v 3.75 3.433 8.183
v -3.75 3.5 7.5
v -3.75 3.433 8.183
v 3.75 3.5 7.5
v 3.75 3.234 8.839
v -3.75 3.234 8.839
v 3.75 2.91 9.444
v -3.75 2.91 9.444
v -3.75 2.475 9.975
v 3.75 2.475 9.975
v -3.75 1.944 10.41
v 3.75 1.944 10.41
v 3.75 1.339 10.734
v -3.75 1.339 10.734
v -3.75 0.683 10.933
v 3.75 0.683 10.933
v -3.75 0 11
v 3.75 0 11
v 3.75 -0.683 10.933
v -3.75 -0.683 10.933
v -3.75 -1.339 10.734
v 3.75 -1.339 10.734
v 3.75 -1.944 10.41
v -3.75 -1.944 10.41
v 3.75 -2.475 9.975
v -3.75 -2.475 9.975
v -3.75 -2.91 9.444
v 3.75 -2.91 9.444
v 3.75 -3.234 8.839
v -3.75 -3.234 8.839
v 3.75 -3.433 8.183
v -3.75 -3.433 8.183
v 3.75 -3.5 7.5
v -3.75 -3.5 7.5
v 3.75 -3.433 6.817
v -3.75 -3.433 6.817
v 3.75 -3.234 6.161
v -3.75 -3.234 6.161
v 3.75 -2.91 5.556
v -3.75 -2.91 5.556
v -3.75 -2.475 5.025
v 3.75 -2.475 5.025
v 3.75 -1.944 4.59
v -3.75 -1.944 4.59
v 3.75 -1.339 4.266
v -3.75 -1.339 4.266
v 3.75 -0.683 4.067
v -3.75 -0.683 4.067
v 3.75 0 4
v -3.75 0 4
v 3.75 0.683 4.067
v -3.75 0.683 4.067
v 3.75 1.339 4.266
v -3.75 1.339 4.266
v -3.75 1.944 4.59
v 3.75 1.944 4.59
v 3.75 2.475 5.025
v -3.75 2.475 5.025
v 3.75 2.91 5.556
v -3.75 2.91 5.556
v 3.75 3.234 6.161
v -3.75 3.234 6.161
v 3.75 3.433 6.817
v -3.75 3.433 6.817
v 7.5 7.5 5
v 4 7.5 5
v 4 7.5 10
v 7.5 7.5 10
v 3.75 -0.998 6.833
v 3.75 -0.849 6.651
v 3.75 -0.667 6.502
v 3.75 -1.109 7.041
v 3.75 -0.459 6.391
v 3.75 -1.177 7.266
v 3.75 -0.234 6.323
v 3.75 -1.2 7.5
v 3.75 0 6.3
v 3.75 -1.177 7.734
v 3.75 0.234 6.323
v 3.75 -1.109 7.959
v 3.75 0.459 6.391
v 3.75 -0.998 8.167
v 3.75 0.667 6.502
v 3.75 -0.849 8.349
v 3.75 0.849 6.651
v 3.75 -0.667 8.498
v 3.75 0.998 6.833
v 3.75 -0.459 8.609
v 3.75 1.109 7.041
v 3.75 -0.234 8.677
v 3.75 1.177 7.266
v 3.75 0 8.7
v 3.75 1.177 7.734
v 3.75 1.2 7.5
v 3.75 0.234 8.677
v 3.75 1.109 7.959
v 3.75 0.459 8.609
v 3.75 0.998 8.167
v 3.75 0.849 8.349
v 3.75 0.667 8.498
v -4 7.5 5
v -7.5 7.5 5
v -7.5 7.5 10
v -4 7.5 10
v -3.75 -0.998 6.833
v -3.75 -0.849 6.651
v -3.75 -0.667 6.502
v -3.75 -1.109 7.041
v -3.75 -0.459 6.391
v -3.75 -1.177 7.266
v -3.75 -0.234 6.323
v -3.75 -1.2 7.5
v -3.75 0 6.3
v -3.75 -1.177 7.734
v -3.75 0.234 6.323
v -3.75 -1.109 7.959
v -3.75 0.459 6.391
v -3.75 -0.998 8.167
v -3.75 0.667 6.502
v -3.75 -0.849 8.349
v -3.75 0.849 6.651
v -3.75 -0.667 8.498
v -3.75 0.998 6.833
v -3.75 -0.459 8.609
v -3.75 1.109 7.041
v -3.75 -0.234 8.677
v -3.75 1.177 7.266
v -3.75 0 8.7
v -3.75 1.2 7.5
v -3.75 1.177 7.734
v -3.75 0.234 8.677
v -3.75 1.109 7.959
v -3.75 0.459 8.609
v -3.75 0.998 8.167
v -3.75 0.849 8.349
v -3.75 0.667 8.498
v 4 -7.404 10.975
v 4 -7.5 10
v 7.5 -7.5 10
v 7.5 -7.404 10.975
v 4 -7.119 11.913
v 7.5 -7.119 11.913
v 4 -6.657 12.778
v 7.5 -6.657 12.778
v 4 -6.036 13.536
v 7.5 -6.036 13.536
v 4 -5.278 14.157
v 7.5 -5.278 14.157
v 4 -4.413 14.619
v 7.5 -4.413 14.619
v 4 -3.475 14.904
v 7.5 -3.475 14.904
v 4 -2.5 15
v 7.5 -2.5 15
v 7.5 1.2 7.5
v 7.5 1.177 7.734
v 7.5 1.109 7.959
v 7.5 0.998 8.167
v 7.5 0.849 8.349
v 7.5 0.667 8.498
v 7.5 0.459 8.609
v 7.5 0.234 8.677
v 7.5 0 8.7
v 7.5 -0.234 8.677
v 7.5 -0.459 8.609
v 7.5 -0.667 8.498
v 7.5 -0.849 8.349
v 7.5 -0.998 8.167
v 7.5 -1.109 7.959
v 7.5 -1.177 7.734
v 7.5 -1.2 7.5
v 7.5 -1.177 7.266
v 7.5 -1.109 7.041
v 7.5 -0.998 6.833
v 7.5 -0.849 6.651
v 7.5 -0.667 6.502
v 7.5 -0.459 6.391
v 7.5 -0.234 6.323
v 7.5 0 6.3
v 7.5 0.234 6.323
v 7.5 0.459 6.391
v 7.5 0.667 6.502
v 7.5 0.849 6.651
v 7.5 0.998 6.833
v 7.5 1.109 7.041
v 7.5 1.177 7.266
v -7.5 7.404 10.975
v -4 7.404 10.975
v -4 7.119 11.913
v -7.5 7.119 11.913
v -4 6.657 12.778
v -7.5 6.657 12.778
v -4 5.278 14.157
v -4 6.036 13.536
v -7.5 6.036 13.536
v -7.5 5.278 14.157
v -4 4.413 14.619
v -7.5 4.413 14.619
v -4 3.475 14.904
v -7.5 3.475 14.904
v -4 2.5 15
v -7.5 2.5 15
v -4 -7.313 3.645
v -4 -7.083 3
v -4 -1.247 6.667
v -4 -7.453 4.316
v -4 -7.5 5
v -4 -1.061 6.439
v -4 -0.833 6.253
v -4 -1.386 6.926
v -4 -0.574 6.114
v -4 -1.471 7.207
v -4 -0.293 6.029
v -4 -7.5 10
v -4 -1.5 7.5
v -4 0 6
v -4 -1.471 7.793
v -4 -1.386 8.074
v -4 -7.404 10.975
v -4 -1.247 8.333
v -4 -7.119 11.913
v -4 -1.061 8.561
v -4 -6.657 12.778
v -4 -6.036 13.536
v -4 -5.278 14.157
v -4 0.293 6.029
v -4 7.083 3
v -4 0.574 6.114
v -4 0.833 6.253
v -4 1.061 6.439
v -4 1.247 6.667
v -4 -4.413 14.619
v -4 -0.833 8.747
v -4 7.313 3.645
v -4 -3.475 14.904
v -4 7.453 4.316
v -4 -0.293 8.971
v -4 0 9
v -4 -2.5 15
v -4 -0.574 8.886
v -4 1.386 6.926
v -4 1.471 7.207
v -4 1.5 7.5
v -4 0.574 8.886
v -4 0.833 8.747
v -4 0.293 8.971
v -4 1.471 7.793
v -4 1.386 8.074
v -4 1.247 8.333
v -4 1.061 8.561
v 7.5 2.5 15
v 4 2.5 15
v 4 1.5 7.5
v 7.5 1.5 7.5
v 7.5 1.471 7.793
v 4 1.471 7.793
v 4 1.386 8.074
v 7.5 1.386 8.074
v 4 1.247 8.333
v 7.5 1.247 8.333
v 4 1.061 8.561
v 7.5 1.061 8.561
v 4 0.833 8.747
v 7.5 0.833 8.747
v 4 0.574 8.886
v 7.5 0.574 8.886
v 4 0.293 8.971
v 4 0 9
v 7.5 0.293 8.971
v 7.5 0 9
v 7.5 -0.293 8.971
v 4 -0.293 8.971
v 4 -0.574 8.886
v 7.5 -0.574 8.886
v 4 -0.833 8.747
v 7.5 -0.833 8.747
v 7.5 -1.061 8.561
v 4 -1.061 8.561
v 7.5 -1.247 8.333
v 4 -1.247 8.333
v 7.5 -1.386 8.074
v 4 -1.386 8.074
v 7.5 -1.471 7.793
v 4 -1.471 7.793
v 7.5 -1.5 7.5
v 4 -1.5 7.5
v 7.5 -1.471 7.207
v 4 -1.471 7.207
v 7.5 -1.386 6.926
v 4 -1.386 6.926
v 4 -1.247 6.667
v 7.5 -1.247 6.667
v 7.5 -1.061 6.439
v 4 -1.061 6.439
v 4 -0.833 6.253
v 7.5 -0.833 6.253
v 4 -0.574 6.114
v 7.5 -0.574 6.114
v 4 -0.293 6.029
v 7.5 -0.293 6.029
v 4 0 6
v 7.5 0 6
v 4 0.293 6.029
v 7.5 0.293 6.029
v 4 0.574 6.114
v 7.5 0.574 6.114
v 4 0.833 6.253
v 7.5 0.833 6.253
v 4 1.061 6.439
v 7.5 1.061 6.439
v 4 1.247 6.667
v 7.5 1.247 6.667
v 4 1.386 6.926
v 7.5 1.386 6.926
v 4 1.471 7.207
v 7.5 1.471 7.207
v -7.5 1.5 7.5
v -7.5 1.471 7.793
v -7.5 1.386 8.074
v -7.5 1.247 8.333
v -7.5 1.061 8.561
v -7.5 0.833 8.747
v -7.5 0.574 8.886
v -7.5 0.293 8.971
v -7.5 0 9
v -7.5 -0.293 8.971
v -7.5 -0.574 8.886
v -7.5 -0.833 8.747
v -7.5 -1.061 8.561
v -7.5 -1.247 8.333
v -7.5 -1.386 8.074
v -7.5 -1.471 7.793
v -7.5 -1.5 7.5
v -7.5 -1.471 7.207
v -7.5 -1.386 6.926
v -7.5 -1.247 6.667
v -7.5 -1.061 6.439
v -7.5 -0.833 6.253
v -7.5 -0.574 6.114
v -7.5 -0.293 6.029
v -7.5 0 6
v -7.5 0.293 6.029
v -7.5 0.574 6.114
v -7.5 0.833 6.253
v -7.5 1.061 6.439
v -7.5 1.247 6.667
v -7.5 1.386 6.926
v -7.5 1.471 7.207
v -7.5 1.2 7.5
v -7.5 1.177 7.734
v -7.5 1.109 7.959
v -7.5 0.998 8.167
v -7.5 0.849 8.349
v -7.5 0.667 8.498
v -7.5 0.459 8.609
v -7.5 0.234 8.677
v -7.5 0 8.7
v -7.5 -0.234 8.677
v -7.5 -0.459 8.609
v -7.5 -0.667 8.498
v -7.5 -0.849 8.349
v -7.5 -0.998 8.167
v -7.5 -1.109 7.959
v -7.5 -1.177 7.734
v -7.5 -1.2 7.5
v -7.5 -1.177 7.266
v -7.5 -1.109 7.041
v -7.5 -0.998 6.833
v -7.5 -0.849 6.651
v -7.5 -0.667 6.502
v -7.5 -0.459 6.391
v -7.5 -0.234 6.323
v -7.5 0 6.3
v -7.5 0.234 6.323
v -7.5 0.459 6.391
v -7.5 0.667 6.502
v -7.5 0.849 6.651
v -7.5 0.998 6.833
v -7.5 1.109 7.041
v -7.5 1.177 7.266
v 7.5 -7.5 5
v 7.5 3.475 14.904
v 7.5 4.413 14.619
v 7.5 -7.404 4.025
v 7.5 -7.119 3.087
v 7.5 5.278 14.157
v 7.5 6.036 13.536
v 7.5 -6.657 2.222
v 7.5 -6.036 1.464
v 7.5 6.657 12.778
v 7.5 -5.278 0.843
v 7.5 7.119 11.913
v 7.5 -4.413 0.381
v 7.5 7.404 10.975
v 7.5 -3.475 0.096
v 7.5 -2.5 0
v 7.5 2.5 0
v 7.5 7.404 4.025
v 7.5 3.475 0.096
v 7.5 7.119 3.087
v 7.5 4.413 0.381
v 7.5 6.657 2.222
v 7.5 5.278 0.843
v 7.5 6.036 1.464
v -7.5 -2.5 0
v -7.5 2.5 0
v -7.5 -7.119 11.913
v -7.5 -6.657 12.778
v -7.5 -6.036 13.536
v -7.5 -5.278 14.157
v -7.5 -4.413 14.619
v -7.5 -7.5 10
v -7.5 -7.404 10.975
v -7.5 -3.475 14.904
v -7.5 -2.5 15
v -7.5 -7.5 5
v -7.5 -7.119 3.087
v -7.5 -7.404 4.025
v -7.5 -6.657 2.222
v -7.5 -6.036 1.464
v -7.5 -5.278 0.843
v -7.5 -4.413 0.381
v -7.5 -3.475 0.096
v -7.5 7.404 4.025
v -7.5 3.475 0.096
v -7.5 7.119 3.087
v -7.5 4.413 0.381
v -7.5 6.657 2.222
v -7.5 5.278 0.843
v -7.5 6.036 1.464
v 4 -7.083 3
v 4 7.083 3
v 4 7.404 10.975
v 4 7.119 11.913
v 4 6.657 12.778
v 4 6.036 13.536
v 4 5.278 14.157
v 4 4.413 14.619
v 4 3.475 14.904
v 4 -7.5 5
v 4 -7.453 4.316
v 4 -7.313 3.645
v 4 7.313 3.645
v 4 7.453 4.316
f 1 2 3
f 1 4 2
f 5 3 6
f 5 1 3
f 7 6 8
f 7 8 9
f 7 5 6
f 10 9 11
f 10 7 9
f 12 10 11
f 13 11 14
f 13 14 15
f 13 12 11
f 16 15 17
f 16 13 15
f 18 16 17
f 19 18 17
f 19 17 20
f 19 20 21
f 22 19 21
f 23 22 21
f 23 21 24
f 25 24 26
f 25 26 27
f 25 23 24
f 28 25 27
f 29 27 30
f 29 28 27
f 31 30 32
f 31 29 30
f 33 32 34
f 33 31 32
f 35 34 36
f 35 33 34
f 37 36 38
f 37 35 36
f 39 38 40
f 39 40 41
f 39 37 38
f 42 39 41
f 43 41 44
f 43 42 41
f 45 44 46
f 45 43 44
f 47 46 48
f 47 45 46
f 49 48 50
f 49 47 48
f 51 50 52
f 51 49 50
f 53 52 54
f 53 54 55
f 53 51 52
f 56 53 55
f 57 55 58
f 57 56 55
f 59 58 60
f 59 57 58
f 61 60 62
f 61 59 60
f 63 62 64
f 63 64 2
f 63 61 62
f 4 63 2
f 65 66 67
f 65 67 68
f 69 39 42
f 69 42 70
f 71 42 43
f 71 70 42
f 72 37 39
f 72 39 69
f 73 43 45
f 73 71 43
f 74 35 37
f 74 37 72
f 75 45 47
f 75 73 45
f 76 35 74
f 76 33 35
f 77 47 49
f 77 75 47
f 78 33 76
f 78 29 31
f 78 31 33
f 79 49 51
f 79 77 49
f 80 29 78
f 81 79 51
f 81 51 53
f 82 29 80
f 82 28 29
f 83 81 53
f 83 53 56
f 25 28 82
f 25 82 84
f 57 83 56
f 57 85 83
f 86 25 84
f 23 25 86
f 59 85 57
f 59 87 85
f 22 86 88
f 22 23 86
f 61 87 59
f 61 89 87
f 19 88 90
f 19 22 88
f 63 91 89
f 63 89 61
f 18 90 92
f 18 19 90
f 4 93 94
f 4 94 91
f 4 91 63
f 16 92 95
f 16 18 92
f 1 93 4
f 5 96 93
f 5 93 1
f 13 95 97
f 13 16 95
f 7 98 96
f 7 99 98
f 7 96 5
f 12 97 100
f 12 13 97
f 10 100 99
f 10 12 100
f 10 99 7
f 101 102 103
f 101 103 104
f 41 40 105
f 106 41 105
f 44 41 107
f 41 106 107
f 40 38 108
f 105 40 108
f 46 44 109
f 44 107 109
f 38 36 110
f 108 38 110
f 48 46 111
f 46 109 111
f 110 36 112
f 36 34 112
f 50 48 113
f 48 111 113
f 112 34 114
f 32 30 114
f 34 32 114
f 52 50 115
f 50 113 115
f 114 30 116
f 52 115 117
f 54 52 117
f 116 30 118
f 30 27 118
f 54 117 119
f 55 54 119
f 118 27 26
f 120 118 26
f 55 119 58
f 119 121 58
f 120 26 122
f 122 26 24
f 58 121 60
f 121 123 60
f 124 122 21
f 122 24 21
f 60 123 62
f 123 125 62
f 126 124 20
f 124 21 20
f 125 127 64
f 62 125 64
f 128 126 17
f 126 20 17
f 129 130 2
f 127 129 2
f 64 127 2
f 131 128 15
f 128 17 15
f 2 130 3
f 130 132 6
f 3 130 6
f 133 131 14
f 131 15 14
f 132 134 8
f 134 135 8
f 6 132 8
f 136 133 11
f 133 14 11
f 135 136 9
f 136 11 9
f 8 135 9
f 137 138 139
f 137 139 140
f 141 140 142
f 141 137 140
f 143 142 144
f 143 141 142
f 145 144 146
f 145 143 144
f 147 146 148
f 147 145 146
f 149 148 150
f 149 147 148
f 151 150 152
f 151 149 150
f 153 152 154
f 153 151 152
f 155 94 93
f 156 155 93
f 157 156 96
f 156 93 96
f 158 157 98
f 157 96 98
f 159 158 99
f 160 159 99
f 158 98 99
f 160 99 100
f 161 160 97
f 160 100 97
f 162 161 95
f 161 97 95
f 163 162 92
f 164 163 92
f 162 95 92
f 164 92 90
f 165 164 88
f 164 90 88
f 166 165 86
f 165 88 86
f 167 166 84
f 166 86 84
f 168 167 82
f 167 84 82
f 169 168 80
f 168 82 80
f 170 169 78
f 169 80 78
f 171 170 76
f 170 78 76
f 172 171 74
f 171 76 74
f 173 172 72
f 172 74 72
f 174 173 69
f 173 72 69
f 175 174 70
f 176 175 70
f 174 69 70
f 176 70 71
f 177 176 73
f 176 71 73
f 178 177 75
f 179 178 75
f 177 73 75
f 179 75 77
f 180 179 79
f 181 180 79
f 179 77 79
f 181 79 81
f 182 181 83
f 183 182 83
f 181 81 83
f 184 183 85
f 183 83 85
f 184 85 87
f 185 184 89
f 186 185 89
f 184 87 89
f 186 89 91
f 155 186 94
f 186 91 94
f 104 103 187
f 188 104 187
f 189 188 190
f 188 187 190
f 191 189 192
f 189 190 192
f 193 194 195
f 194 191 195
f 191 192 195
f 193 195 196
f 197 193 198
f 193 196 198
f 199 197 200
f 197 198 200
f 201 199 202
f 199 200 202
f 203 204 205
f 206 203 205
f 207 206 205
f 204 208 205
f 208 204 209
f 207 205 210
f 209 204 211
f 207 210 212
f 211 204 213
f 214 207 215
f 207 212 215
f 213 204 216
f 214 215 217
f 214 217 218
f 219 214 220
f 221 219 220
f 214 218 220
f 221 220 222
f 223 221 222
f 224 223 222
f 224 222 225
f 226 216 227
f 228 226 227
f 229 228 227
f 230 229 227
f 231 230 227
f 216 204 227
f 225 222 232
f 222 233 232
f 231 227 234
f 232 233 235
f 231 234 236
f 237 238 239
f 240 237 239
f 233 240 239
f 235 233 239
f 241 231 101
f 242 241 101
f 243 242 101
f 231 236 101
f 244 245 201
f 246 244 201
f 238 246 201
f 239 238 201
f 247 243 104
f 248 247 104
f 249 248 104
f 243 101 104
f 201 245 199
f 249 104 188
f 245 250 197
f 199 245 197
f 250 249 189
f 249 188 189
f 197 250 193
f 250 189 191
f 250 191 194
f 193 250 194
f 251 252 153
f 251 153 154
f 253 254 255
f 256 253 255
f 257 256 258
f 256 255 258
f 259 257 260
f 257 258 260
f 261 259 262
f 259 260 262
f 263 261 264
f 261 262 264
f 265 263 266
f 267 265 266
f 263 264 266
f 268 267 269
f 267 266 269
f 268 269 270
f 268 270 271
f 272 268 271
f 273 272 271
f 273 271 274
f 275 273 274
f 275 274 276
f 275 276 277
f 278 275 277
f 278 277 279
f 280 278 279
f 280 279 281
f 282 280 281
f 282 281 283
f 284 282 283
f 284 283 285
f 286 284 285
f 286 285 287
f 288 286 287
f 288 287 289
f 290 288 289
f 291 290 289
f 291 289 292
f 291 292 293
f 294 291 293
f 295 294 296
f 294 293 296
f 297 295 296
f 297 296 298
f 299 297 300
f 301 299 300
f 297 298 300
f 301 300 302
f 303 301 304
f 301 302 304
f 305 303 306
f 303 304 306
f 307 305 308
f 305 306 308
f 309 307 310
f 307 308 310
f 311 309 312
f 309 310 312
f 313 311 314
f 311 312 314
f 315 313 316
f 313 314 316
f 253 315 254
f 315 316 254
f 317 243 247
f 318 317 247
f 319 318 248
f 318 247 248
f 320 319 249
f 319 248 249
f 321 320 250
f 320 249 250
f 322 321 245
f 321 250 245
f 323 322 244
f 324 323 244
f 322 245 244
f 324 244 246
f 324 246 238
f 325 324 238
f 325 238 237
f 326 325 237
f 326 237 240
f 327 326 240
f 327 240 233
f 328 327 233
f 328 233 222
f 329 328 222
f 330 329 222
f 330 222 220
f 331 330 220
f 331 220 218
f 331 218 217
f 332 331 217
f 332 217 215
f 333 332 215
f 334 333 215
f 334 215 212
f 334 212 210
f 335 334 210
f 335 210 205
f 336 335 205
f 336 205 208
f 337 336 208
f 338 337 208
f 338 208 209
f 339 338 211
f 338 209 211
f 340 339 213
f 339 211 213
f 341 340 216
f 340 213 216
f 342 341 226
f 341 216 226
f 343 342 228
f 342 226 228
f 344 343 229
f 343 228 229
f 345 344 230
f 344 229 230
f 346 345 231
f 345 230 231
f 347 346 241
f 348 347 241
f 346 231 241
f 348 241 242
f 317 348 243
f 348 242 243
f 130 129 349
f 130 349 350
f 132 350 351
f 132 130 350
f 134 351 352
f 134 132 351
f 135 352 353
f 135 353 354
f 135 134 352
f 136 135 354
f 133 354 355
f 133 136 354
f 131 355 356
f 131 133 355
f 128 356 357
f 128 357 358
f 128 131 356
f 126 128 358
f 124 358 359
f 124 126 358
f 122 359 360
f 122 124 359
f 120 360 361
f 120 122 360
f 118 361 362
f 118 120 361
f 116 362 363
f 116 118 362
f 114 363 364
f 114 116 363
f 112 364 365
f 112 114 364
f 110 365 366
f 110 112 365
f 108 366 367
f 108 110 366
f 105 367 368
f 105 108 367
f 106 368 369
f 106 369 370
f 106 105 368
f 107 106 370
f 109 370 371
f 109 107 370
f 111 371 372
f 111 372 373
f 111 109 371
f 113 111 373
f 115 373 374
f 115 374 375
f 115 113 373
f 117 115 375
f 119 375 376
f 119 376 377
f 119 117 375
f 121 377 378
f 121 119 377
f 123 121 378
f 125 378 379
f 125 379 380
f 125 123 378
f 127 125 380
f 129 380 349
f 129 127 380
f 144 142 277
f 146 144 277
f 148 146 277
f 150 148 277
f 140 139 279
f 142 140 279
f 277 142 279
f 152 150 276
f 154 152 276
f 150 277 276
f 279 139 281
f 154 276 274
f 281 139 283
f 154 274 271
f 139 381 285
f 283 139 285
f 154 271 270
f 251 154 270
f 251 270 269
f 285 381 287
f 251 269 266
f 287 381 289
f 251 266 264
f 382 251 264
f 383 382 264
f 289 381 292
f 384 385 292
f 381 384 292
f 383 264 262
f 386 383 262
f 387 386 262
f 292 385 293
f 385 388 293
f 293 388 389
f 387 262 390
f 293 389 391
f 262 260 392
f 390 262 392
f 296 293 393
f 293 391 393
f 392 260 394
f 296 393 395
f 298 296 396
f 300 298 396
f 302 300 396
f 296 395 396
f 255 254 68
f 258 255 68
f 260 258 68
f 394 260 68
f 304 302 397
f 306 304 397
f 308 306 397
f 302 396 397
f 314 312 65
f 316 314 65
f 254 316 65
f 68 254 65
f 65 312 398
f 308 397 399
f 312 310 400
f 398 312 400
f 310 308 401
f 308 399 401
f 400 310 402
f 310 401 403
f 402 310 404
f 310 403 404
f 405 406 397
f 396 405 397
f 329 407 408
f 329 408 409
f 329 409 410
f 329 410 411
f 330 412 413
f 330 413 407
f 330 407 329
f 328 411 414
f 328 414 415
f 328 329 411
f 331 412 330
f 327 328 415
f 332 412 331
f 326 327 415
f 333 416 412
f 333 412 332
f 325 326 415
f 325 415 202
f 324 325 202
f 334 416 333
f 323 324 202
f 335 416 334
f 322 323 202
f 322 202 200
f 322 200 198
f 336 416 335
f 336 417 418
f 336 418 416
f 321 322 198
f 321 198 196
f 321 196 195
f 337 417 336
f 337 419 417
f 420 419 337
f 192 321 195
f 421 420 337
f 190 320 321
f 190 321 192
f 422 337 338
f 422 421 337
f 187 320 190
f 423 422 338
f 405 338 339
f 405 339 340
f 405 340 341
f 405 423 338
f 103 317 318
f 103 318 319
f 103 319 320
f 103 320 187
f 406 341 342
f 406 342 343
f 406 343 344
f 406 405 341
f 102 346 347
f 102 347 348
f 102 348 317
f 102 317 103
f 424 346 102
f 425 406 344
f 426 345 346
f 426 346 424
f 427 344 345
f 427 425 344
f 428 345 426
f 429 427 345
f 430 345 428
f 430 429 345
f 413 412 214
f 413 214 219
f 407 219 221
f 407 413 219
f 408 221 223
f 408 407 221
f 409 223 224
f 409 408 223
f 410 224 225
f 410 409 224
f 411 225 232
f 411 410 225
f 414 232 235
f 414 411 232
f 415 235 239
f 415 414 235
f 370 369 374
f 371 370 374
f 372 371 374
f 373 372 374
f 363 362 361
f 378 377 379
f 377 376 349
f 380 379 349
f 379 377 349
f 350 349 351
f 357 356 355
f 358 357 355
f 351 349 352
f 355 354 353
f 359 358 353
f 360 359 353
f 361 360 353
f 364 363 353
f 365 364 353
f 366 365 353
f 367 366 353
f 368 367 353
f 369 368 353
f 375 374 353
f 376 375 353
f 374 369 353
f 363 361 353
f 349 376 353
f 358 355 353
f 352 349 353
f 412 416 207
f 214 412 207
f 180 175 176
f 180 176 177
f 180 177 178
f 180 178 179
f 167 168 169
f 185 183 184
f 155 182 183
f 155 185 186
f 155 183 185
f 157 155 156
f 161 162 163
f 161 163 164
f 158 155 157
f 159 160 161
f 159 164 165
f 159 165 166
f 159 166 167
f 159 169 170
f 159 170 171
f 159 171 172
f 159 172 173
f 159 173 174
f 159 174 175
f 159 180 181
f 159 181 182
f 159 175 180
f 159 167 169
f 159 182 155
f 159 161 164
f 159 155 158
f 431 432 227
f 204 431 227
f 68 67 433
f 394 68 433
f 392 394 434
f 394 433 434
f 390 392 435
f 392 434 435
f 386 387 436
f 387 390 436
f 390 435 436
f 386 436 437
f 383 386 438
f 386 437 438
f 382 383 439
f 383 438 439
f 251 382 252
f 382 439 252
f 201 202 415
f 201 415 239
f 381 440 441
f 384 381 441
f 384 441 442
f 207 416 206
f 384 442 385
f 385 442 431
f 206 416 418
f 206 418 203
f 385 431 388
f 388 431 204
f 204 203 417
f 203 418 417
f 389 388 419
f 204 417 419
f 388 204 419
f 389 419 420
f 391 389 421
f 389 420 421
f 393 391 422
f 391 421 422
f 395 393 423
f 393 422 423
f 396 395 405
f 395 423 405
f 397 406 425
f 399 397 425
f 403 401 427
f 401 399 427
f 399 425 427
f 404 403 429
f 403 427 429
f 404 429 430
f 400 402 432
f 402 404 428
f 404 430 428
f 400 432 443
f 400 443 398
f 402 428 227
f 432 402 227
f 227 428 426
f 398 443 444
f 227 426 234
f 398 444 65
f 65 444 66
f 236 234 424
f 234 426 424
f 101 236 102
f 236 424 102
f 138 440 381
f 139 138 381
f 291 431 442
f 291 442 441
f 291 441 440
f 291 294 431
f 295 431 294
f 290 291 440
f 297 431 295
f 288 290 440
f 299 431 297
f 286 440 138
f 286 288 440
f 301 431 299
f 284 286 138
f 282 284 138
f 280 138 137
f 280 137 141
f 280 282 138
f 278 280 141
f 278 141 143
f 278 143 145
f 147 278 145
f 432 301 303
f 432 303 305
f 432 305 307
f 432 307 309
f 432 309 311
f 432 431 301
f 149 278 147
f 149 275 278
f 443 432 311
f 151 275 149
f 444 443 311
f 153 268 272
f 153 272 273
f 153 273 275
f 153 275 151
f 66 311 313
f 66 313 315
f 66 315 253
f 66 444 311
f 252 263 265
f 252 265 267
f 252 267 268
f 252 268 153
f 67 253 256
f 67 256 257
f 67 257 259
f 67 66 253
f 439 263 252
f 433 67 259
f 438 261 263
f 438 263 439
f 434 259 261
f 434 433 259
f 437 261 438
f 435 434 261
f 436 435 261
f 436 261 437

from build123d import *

# Parameters (mm, degrees)
F0_W         = 15
F0_H         = 15
F1_DEPTH     = 15
F3_D         = 3
F4_W         = 8
F4_H         = 12
F5_DEPTH     = 15.001
F6_R         = 3.5
F7_DEPTH     = 3.75
F8_R         = 1.2
F9_DEPTH     = 3.75
F10_T1_DEPTH = 28.5
F10_T3_DEPTH = 28.5
F10_T5_DEPTH = 40


# Not quite as in the source:
# - a fillet or chamfer that OpenCascade refuses, or shapes differently, is made with other operations: its cross-section is extruded or revolved along the edge and cut away or added
# - a pattern or mirror of a feature is missing from the dataset's text; its kind, count and spacing are read off the source's solid


with BuildPart() as f1:
    # F0 (on Top) → F1 (new body)
    with BuildSketch(Plane.XY):
        Rectangle(F0_W, F0_H)
    extrude(amount=F1_DEPTH)

    # F3 (through all)
    with Locations(Plane(origin=(-7.5, 0, 0), x_dir=(0, -1, 0), z_dir=(-1, 0, 0))):
        with Locations((0, 7.5)):
            Hole(F3_D / 2)

    # F4 (on face) → F5 (cut, through all)
    with BuildSketch(Plane(origin=(0, 7.5, 0), x_dir=(-1, 0, 0), z_dir=(0, 1, 0))):
        with Locations((0, 9)):
            Rectangle(F4_W, F4_H)
    extrude(amount=-F5_DEPTH, mode=Mode.SUBTRACT)

    # F10: fillet of radius 5 on 6 edges, made by hand

    # F10_s2 → F10_t1 (cut)
    with BuildSketch(Plane.YZ.offset(-20)):
        with BuildLine():
            ThreePointArc((-7.5, 10), (-6.0355339059, 13.5355339059), (-2.5, 15))
            Line((-2.5, 15), (-7.5, 15))
            Line((-7.5, 15), (-7.5, 10))
        make_face()
        with BuildLine():
            ThreePointArc((7.5, 10), (6.0355339059, 13.5355339059), (2.5, 15))
            Line((2.5, 15), (7.5, 15))
            Line((7.5, 15), (7.5, 10))
        make_face()
    extrude(amount=F10_T1_DEPTH, mode=Mode.SUBTRACT)

    # F10_s4 → F10_t3 (cut)
    with BuildSketch(Plane.YZ.offset(-8.5)):
        with BuildLine():
            ThreePointArc((-7.5, 10), (-6.0355339059, 13.5355339059), (-2.5, 15))
            Line((-2.5, 15), (-7.5, 15))
            Line((-7.5, 15), (-7.5, 10))
        make_face()
        with BuildLine():
            ThreePointArc((2.5, 15), (6.0355339059, 13.5355339059), (7.5, 10))
            Line((7.5, 10), (7.5, 15))
            Line((7.5, 15), (2.5, 15))
        make_face()
    extrude(amount=F10_T3_DEPTH, mode=Mode.SUBTRACT)

    # F10_s6 → F10_t5 (cut)
    with BuildSketch(Plane.YZ.offset(-20)):
        with BuildLine():
            ThreePointArc((2.5, 0), (6.0355339059, 1.4644660941), (7.5, 5))
            Line((7.5, 5), (7.5, 0))
            Line((7.5, 0), (2.5, 0))
        make_face()
        with BuildLine():
            ThreePointArc((-7.5, 5), (-6.0355339059, 1.4644660941), (-2.5, 0))
            Line((-2.5, 0), (-7.5, 0))
            Line((-7.5, 0), (-7.5, 5))
        make_face()
    extrude(amount=F10_T5_DEPTH, mode=Mode.SUBTRACT)


with BuildPart() as f7:
    # F6 (on Right) → F7 (new body, symmetric)
    with BuildSketch(Plane.YZ):
        with Locations((0, 7.5)):
            Circle(F6_R)
    extrude(amount=F7_DEPTH, both=True)

    # F8 (on face) → F9 (join)
    with BuildSketch(Plane.YZ.offset(3.75)):
        with Locations((0, 7.5)):
            Circle(F8_R)
    f9 = extrude(amount=F9_DEPTH)

    # F9_copies: F9 across plane
    add(f9.mirror(Plane(origin=(0, 0, 0), x_dir=(0, 0, -1), z_dir=(-1, 0, 0))))


solid = Compound([f1.part, f7.part])
